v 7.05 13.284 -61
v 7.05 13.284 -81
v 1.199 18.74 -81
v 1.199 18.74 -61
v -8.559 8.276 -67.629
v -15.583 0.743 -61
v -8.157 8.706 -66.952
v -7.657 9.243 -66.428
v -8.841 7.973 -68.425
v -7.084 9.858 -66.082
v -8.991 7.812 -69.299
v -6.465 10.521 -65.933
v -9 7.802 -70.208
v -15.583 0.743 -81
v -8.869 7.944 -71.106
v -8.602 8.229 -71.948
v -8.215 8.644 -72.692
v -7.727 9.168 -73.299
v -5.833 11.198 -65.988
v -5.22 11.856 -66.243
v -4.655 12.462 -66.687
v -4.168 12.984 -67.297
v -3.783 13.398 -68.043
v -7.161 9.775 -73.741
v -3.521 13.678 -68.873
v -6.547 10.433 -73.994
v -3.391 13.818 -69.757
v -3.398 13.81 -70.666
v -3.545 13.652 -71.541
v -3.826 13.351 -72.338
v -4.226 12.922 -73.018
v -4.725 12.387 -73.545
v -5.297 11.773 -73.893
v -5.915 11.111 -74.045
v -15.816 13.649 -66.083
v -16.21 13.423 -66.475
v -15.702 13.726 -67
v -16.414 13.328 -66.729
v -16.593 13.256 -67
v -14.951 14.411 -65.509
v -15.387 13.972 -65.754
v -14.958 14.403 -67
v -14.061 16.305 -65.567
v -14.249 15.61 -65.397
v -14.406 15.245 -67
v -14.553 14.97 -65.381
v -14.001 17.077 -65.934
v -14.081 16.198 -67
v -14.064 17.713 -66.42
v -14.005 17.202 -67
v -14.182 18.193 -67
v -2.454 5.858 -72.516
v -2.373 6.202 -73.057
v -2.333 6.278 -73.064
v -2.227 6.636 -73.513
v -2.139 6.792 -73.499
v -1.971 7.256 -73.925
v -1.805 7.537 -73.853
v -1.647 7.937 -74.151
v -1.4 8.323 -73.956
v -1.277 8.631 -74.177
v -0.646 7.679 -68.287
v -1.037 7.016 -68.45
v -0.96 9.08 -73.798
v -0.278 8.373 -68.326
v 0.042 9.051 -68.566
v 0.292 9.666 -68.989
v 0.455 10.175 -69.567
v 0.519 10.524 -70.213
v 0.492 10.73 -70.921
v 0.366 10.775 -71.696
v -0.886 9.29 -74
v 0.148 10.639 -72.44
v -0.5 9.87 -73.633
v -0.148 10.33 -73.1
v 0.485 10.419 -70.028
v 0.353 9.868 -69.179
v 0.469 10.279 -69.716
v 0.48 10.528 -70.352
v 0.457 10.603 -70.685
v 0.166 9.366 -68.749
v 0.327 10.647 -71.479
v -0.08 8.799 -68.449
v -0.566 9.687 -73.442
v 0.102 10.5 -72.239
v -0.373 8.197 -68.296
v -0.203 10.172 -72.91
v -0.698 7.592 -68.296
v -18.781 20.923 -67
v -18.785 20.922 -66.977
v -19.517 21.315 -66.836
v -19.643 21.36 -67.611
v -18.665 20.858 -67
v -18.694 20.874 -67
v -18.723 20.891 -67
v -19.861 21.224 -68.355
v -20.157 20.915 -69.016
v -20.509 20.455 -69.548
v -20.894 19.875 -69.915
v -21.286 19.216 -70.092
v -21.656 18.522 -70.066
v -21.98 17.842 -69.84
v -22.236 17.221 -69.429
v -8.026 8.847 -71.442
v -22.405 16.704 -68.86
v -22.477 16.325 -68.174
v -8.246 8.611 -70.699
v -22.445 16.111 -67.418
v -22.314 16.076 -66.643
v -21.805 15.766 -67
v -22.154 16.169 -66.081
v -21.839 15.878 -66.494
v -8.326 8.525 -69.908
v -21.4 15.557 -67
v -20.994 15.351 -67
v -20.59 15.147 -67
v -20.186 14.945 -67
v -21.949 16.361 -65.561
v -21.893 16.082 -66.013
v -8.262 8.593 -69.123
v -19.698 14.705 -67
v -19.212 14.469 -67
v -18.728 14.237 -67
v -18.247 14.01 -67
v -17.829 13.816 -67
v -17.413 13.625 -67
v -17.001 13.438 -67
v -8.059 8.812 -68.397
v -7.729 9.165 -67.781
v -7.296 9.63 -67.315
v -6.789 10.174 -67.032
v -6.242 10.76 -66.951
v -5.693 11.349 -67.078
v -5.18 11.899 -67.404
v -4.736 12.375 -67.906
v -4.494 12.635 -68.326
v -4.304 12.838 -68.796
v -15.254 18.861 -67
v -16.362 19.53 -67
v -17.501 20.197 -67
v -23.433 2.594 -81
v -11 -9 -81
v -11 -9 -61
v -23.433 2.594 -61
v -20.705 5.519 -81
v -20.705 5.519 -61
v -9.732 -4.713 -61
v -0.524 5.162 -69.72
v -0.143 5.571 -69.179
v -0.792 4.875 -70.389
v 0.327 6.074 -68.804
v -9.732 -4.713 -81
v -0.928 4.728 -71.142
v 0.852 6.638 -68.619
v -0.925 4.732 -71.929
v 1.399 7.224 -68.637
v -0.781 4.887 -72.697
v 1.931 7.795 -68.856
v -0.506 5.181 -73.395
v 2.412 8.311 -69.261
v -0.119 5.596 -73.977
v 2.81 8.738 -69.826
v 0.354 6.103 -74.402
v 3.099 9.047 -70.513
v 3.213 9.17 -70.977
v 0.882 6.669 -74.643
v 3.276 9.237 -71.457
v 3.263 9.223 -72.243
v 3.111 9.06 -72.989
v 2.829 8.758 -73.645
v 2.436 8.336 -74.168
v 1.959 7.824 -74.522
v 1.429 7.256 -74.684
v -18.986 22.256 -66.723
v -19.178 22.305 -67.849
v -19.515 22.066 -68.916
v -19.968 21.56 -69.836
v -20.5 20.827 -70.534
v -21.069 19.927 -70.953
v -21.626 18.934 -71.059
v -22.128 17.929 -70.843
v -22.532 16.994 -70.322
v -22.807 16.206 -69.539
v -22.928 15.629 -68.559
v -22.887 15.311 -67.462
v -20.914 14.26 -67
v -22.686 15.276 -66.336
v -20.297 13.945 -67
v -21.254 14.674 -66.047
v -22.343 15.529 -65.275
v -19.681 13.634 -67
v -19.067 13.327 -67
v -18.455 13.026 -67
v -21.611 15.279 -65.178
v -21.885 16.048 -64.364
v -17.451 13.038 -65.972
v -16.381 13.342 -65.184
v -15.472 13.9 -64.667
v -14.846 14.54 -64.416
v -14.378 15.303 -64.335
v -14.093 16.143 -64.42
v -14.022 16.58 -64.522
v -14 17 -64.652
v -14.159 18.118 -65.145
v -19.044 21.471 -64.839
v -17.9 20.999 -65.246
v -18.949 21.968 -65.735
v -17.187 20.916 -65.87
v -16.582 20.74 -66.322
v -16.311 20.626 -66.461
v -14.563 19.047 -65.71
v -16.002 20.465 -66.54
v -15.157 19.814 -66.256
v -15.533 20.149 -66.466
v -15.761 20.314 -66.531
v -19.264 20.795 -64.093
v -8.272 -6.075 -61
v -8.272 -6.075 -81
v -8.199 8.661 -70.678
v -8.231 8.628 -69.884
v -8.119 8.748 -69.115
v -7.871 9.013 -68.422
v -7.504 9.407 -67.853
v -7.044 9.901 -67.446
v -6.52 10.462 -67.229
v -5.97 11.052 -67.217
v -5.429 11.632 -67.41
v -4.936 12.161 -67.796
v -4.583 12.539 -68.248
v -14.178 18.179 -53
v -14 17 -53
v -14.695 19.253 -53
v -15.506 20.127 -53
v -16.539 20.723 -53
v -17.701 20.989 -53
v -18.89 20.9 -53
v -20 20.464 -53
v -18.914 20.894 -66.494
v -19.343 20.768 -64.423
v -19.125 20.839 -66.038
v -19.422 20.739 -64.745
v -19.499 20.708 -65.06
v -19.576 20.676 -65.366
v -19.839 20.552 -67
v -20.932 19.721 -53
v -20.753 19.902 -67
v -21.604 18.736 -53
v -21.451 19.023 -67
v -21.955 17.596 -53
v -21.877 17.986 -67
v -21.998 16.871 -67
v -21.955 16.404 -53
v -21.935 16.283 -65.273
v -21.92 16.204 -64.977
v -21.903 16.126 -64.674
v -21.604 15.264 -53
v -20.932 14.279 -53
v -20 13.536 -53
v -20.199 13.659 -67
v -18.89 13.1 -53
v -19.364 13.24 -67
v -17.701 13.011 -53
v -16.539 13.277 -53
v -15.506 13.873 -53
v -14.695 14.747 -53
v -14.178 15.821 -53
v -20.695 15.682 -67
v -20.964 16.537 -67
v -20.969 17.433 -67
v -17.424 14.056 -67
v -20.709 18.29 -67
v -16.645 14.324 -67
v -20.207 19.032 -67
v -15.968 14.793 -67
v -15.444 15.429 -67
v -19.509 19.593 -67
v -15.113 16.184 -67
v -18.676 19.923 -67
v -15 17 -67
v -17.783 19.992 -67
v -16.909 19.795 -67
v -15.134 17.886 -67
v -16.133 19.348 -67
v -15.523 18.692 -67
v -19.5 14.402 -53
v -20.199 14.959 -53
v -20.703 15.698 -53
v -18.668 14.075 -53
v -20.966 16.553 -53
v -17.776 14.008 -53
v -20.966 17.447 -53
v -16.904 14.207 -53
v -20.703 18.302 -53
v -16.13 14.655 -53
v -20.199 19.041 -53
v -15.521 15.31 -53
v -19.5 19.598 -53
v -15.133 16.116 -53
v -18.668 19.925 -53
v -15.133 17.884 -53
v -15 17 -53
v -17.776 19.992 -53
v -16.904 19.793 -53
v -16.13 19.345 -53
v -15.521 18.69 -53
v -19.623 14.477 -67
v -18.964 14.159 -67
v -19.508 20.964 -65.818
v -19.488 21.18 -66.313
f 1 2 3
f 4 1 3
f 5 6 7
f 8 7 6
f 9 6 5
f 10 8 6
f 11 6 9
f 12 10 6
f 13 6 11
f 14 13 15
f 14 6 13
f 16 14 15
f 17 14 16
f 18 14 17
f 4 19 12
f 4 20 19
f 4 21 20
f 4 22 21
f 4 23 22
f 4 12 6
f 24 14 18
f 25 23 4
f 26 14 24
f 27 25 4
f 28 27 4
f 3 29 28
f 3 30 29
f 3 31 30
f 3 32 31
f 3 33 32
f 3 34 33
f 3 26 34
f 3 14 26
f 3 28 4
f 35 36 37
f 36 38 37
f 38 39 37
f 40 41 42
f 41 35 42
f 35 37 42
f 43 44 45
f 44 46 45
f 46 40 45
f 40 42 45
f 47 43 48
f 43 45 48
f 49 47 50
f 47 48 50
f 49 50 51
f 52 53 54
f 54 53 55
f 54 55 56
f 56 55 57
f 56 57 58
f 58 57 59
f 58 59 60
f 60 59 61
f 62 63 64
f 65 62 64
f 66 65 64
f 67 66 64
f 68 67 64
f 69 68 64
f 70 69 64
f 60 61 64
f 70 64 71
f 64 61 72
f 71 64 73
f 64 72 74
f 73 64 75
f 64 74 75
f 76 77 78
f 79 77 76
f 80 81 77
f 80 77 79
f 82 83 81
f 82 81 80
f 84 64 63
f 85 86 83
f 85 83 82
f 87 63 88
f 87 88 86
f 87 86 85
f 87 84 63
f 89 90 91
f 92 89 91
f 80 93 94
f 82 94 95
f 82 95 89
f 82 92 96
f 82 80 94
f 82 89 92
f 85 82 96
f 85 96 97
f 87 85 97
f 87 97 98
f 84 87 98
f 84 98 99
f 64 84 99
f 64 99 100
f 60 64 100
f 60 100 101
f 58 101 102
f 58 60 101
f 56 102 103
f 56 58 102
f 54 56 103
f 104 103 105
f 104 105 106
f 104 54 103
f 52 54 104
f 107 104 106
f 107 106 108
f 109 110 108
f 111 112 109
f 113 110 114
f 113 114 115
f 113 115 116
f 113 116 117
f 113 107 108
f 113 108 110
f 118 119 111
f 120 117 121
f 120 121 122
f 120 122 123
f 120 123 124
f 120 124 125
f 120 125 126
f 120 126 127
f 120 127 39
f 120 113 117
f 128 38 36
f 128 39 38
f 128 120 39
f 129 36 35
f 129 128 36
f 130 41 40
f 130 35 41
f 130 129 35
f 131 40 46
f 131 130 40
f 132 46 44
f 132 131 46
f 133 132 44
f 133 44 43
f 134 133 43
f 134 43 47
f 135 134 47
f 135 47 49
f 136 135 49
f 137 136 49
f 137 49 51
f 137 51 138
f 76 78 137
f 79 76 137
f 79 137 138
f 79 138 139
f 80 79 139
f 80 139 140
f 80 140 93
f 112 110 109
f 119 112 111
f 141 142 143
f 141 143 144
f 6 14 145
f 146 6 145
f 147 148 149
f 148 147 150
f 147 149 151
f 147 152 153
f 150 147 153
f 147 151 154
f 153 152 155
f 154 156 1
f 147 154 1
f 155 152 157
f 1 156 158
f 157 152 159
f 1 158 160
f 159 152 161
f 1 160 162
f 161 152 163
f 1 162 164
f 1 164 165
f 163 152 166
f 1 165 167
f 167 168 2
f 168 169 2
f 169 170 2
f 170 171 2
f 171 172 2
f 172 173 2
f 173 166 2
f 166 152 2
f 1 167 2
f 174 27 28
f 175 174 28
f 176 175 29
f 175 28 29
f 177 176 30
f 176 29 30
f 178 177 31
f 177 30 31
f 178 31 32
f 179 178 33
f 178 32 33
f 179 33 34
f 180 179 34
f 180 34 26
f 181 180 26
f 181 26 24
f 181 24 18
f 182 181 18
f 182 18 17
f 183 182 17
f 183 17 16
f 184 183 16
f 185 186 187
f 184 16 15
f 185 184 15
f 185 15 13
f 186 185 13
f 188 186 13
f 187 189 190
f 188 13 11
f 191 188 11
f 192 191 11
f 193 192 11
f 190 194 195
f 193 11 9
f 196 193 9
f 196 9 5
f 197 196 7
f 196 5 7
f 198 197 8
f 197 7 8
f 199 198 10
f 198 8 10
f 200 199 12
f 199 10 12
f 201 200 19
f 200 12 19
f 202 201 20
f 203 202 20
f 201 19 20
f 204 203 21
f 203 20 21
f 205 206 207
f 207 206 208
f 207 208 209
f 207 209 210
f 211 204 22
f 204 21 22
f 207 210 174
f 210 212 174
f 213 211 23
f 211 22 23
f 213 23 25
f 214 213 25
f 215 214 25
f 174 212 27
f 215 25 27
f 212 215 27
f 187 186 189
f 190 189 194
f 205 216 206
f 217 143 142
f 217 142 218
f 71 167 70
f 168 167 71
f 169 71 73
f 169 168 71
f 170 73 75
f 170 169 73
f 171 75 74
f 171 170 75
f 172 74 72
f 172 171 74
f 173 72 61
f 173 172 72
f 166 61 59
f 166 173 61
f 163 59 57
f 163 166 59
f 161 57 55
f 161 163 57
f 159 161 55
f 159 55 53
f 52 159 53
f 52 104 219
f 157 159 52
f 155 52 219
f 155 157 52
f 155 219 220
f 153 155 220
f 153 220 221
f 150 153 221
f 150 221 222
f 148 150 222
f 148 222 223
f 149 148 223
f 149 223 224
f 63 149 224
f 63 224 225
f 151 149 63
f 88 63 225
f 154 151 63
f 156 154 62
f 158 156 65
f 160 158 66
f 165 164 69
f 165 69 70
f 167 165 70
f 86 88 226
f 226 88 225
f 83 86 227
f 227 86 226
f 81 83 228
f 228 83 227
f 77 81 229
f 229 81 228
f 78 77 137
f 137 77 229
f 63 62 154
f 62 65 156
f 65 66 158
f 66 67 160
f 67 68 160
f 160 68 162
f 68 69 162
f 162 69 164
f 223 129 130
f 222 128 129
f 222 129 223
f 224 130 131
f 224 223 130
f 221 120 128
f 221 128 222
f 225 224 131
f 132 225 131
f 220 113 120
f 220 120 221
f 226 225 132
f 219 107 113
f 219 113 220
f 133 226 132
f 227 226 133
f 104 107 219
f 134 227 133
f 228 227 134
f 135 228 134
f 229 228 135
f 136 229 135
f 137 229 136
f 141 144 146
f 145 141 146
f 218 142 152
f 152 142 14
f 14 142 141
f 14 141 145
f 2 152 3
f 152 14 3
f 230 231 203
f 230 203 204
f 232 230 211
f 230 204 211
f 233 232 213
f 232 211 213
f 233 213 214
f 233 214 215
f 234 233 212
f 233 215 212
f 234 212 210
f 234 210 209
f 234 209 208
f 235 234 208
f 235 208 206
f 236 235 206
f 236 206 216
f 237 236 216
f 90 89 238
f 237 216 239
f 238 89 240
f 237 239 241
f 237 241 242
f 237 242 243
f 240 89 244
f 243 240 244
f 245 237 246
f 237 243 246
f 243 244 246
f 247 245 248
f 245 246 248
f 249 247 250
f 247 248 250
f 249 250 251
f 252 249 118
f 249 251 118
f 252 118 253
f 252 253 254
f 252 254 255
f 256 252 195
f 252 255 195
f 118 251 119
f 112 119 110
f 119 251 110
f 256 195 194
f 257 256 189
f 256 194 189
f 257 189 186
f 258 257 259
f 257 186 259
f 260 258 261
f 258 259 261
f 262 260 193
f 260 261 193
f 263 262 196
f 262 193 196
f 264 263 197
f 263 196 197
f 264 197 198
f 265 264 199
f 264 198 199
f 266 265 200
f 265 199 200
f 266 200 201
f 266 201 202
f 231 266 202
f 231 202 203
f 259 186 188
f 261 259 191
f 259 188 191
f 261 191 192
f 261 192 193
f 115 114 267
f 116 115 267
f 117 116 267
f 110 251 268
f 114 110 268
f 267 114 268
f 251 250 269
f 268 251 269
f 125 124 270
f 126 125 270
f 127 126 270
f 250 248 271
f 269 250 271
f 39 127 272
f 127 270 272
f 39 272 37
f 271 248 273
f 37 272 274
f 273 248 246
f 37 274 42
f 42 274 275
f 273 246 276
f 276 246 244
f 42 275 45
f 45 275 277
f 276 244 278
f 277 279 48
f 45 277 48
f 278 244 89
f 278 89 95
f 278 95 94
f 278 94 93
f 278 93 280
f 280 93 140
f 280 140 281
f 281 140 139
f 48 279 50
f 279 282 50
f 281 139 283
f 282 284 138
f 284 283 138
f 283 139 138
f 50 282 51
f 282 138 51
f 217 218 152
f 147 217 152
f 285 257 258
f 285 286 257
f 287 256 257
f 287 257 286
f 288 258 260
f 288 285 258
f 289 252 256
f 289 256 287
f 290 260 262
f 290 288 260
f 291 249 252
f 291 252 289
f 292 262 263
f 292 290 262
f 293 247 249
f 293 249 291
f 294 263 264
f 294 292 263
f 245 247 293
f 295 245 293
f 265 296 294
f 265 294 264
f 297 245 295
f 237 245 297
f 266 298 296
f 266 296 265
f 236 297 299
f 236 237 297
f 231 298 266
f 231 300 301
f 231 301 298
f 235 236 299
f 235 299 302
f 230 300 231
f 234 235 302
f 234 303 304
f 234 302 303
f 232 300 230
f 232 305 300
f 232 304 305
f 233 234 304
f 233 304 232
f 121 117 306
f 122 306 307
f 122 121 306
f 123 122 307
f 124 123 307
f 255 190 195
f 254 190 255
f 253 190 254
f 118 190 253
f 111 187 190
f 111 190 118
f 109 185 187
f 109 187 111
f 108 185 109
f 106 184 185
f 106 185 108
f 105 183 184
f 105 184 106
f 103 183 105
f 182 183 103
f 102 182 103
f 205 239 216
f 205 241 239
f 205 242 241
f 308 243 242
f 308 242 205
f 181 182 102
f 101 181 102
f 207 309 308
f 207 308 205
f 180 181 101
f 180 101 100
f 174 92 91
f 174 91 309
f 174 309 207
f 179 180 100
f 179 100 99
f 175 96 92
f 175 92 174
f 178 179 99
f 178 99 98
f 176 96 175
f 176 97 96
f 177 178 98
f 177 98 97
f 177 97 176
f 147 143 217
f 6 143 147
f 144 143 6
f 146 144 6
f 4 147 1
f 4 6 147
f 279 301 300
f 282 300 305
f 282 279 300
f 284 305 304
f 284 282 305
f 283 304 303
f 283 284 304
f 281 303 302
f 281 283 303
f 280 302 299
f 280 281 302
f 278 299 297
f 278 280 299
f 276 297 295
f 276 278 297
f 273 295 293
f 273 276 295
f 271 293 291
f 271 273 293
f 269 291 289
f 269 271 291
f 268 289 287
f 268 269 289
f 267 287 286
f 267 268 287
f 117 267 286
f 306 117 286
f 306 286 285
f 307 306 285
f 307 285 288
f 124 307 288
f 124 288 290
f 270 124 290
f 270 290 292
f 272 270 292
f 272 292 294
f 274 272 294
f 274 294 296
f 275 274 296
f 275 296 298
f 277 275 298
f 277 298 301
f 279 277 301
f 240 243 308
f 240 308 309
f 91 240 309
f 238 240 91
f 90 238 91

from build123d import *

# Parameters (mm, degrees)
CYLINDER058_R               = 3
CYLINDER058_DEPTH           = 14
CYLINDER059_R               = 4
CYLINDER059_DEPTH           = 14
CYLINDER057_R               = 3
CYLINDER057_DEPTH           = 25
CYLINDER057_ROLL_ANGLE      = -80.307838
CYLINDER057_PITCH_ANGLE     = -6.032922
CYLINDER057_PLACEMENT_ANGLE = 60.76787
CYLINDER055_R               = 4
CYLINDER055_DEPTH           = 23
CYLINDER055_ROLL_ANGLE      = -80.242002
CYLINDER055_PITCH_ANGLE     = -5.711725
CYLINDER055_PLACEMENT_ANGLE = 60.604575
CYLINDER056_R               = 3
CYLINDER056_DEPTH           = 20
CYLINDER056_ROLL_ANGLE      = -80.307852
CYLINDER056_PITCH_ANGLE     = -6.032925
CYLINDER056_PLACEMENT_ANGLE = 60.767852
BOX022_W                    = 25
BOX022_H                    = 8
BOX022_DEPTH                = 20
BOX022_PLACEMENT_ANGLE      = 47
BOX021_W                    = 4
BOX021_H                    = 17
BOX021_DEPTH                = 20
BOX021_PLACEMENT_ANGLE      = 47


with BuildPart() as cylindre054:
    # Cylinder058 → Cylinder058 (new body)
    with BuildSketch(Plane(origin=(-18, 17, -67), x_dir=(1, 0, 0), z_dir=(0, 0, 1))):
        Circle(CYLINDER058_R)
    extrude(amount=CYLINDER058_DEPTH)


with BuildPart() as cylindre055:
    # Cylinder059 → Cylinder059 (new body)
    with BuildSketch(Plane(origin=(-18, 17, -67), x_dir=(1, 0, 0), z_dir=(0, 0, 1))):
        Circle(CYLINDER059_R)
    extrude(amount=CYLINDER059_DEPTH)


with BuildPart() as cylindre053:
    # Cylinder057 → Cylinder057 (new body)
    with BuildSketch(Plane.XY):
        Circle(CYLINDER057_R)
    extrude(amount=CYLINDER057_DEPTH)


with BuildPart() as cylindre053_1:
    # Cylinder057 roll: moved
    add(cylindre053.part.rotate(Axis((0, 0, 0), (1, 0, 0)), CYLINDER057_ROLL_ANGLE))


with BuildPart() as cylindre053_2:
    # Cylinder057 pitch: moved
    add(cylindre053_1.part.rotate(Axis((0, 0, 0), (0, 1, 0)), CYLINDER057_PITCH_ANGLE))


with BuildPart() as cylindre053_3:
    # Cylinder057 placement: moved
    add(cylindre053_2.part.moved(Location((-3, 6, -72))).rotate(Axis((-3, 6, -72), (0, 0, 1)), CYLINDER057_PLACEMENT_ANGLE))


with BuildPart() as cut039:
    # Cylinder055 → Cylinder055 (new body)
    with BuildSketch(Plane.XY):
        Circle(CYLINDER055_R)
    extrude(amount=CYLINDER055_DEPTH)


with BuildPart() as cut039_1:
    # Cylinder055 roll: moved
    add(cut039.part.rotate(Axis((0, 0, 0), (1, 0, 0)), CYLINDER055_ROLL_ANGLE))


with BuildPart() as cut039_2:
    # Cylinder055 pitch: moved
    add(cut039_1.part.rotate(Axis((0, 0, 0), (0, 1, 0)), CYLINDER055_PITCH_ANGLE))


with BuildPart() as cut039_3:
    # Cylinder055 placement: moved
    add(cut039_2.part.moved(Location((-3, 6, -72))).rotate(Axis((-3, 6, -72), (0, 0, 1)), CYLINDER055_PLACEMENT_ANGLE))

    # Cut038: cut Cylindre053
    add(cylindre053_3.part, mode=Mode.SUBTRACT)


with BuildPart() as cut039_4:
    # Cut038 placement: moved
    add(cut039_3.part.moved(Location((2, 2, 1))))

    # Fusion027: union Cylindre055
    add(cylindre055.part)

    # Cut039: cut Cylindre054
    add(cylindre054.part, mode=Mode.SUBTRACT)


with BuildPart() as cylindre052:
    # Cylinder056 → Cylinder056 (new body)
    with BuildSketch(Plane.XY):
        Circle(CYLINDER056_R)
    extrude(amount=CYLINDER056_DEPTH)


with BuildPart() as cylindre052_1:
    # Cylinder056 roll: moved
    add(cylindre052.part.rotate(Axis((0, 0, 0), (1, 0, 0)), CYLINDER056_ROLL_ANGLE))


with BuildPart() as cylindre052_2:
    # Cylinder056 pitch: moved
    add(cylindre052_1.part.rotate(Axis((0, 0, 0), (0, 1, 0)), CYLINDER056_PITCH_ANGLE))


with BuildPart() as cylindre052_3:
    # Cylinder056 placement: moved
    add(cylindre052_2.part.moved(Location((3, 6, -72))).rotate(Axis((3, 6, -72), (0, 0, 1)), CYLINDER056_PLACEMENT_ANGLE))


with BuildPart() as cube022:
    # Box022 → Box022 (new body)
    with BuildSketch(Plane.XY):
        with Locations((12.5, 4)):
            Rectangle(BOX022_W, BOX022_H)
    extrude(amount=BOX022_DEPTH)


with BuildPart() as cube022_1:
    # Box022 placement: moved
    add(cube022.part.moved(Location((-10, -5, -81))).rotate(Axis((-10, -5, -81), (0, 0, 1)), BOX022_PLACEMENT_ANGLE))


with BuildPart() as fusion028:
    # Box021 → Box021 (new body)
    with BuildSketch(Plane.XY):
        with Locations((2, 8.5)):
            Rectangle(BOX021_W, BOX021_H)
    extrude(amount=BOX021_DEPTH)


with BuildPart() as fusion028_1:
    # Box021 placement: moved
    add(fusion028.part.moved(Location((-11, -9, -81))).rotate(Axis((-11, -9, -81), (0, 0, 1)), BOX021_PLACEMENT_ANGLE))

    # Fusion023: union Cube022
    add(cube022_1.part)

    # Cut037: cut Cylindre052
    add(cylindre052_3.part, mode=Mode.SUBTRACT)

    # Fusion028: union Cut039
    add(cut039_4.part)


solid = fusion028_1.part
